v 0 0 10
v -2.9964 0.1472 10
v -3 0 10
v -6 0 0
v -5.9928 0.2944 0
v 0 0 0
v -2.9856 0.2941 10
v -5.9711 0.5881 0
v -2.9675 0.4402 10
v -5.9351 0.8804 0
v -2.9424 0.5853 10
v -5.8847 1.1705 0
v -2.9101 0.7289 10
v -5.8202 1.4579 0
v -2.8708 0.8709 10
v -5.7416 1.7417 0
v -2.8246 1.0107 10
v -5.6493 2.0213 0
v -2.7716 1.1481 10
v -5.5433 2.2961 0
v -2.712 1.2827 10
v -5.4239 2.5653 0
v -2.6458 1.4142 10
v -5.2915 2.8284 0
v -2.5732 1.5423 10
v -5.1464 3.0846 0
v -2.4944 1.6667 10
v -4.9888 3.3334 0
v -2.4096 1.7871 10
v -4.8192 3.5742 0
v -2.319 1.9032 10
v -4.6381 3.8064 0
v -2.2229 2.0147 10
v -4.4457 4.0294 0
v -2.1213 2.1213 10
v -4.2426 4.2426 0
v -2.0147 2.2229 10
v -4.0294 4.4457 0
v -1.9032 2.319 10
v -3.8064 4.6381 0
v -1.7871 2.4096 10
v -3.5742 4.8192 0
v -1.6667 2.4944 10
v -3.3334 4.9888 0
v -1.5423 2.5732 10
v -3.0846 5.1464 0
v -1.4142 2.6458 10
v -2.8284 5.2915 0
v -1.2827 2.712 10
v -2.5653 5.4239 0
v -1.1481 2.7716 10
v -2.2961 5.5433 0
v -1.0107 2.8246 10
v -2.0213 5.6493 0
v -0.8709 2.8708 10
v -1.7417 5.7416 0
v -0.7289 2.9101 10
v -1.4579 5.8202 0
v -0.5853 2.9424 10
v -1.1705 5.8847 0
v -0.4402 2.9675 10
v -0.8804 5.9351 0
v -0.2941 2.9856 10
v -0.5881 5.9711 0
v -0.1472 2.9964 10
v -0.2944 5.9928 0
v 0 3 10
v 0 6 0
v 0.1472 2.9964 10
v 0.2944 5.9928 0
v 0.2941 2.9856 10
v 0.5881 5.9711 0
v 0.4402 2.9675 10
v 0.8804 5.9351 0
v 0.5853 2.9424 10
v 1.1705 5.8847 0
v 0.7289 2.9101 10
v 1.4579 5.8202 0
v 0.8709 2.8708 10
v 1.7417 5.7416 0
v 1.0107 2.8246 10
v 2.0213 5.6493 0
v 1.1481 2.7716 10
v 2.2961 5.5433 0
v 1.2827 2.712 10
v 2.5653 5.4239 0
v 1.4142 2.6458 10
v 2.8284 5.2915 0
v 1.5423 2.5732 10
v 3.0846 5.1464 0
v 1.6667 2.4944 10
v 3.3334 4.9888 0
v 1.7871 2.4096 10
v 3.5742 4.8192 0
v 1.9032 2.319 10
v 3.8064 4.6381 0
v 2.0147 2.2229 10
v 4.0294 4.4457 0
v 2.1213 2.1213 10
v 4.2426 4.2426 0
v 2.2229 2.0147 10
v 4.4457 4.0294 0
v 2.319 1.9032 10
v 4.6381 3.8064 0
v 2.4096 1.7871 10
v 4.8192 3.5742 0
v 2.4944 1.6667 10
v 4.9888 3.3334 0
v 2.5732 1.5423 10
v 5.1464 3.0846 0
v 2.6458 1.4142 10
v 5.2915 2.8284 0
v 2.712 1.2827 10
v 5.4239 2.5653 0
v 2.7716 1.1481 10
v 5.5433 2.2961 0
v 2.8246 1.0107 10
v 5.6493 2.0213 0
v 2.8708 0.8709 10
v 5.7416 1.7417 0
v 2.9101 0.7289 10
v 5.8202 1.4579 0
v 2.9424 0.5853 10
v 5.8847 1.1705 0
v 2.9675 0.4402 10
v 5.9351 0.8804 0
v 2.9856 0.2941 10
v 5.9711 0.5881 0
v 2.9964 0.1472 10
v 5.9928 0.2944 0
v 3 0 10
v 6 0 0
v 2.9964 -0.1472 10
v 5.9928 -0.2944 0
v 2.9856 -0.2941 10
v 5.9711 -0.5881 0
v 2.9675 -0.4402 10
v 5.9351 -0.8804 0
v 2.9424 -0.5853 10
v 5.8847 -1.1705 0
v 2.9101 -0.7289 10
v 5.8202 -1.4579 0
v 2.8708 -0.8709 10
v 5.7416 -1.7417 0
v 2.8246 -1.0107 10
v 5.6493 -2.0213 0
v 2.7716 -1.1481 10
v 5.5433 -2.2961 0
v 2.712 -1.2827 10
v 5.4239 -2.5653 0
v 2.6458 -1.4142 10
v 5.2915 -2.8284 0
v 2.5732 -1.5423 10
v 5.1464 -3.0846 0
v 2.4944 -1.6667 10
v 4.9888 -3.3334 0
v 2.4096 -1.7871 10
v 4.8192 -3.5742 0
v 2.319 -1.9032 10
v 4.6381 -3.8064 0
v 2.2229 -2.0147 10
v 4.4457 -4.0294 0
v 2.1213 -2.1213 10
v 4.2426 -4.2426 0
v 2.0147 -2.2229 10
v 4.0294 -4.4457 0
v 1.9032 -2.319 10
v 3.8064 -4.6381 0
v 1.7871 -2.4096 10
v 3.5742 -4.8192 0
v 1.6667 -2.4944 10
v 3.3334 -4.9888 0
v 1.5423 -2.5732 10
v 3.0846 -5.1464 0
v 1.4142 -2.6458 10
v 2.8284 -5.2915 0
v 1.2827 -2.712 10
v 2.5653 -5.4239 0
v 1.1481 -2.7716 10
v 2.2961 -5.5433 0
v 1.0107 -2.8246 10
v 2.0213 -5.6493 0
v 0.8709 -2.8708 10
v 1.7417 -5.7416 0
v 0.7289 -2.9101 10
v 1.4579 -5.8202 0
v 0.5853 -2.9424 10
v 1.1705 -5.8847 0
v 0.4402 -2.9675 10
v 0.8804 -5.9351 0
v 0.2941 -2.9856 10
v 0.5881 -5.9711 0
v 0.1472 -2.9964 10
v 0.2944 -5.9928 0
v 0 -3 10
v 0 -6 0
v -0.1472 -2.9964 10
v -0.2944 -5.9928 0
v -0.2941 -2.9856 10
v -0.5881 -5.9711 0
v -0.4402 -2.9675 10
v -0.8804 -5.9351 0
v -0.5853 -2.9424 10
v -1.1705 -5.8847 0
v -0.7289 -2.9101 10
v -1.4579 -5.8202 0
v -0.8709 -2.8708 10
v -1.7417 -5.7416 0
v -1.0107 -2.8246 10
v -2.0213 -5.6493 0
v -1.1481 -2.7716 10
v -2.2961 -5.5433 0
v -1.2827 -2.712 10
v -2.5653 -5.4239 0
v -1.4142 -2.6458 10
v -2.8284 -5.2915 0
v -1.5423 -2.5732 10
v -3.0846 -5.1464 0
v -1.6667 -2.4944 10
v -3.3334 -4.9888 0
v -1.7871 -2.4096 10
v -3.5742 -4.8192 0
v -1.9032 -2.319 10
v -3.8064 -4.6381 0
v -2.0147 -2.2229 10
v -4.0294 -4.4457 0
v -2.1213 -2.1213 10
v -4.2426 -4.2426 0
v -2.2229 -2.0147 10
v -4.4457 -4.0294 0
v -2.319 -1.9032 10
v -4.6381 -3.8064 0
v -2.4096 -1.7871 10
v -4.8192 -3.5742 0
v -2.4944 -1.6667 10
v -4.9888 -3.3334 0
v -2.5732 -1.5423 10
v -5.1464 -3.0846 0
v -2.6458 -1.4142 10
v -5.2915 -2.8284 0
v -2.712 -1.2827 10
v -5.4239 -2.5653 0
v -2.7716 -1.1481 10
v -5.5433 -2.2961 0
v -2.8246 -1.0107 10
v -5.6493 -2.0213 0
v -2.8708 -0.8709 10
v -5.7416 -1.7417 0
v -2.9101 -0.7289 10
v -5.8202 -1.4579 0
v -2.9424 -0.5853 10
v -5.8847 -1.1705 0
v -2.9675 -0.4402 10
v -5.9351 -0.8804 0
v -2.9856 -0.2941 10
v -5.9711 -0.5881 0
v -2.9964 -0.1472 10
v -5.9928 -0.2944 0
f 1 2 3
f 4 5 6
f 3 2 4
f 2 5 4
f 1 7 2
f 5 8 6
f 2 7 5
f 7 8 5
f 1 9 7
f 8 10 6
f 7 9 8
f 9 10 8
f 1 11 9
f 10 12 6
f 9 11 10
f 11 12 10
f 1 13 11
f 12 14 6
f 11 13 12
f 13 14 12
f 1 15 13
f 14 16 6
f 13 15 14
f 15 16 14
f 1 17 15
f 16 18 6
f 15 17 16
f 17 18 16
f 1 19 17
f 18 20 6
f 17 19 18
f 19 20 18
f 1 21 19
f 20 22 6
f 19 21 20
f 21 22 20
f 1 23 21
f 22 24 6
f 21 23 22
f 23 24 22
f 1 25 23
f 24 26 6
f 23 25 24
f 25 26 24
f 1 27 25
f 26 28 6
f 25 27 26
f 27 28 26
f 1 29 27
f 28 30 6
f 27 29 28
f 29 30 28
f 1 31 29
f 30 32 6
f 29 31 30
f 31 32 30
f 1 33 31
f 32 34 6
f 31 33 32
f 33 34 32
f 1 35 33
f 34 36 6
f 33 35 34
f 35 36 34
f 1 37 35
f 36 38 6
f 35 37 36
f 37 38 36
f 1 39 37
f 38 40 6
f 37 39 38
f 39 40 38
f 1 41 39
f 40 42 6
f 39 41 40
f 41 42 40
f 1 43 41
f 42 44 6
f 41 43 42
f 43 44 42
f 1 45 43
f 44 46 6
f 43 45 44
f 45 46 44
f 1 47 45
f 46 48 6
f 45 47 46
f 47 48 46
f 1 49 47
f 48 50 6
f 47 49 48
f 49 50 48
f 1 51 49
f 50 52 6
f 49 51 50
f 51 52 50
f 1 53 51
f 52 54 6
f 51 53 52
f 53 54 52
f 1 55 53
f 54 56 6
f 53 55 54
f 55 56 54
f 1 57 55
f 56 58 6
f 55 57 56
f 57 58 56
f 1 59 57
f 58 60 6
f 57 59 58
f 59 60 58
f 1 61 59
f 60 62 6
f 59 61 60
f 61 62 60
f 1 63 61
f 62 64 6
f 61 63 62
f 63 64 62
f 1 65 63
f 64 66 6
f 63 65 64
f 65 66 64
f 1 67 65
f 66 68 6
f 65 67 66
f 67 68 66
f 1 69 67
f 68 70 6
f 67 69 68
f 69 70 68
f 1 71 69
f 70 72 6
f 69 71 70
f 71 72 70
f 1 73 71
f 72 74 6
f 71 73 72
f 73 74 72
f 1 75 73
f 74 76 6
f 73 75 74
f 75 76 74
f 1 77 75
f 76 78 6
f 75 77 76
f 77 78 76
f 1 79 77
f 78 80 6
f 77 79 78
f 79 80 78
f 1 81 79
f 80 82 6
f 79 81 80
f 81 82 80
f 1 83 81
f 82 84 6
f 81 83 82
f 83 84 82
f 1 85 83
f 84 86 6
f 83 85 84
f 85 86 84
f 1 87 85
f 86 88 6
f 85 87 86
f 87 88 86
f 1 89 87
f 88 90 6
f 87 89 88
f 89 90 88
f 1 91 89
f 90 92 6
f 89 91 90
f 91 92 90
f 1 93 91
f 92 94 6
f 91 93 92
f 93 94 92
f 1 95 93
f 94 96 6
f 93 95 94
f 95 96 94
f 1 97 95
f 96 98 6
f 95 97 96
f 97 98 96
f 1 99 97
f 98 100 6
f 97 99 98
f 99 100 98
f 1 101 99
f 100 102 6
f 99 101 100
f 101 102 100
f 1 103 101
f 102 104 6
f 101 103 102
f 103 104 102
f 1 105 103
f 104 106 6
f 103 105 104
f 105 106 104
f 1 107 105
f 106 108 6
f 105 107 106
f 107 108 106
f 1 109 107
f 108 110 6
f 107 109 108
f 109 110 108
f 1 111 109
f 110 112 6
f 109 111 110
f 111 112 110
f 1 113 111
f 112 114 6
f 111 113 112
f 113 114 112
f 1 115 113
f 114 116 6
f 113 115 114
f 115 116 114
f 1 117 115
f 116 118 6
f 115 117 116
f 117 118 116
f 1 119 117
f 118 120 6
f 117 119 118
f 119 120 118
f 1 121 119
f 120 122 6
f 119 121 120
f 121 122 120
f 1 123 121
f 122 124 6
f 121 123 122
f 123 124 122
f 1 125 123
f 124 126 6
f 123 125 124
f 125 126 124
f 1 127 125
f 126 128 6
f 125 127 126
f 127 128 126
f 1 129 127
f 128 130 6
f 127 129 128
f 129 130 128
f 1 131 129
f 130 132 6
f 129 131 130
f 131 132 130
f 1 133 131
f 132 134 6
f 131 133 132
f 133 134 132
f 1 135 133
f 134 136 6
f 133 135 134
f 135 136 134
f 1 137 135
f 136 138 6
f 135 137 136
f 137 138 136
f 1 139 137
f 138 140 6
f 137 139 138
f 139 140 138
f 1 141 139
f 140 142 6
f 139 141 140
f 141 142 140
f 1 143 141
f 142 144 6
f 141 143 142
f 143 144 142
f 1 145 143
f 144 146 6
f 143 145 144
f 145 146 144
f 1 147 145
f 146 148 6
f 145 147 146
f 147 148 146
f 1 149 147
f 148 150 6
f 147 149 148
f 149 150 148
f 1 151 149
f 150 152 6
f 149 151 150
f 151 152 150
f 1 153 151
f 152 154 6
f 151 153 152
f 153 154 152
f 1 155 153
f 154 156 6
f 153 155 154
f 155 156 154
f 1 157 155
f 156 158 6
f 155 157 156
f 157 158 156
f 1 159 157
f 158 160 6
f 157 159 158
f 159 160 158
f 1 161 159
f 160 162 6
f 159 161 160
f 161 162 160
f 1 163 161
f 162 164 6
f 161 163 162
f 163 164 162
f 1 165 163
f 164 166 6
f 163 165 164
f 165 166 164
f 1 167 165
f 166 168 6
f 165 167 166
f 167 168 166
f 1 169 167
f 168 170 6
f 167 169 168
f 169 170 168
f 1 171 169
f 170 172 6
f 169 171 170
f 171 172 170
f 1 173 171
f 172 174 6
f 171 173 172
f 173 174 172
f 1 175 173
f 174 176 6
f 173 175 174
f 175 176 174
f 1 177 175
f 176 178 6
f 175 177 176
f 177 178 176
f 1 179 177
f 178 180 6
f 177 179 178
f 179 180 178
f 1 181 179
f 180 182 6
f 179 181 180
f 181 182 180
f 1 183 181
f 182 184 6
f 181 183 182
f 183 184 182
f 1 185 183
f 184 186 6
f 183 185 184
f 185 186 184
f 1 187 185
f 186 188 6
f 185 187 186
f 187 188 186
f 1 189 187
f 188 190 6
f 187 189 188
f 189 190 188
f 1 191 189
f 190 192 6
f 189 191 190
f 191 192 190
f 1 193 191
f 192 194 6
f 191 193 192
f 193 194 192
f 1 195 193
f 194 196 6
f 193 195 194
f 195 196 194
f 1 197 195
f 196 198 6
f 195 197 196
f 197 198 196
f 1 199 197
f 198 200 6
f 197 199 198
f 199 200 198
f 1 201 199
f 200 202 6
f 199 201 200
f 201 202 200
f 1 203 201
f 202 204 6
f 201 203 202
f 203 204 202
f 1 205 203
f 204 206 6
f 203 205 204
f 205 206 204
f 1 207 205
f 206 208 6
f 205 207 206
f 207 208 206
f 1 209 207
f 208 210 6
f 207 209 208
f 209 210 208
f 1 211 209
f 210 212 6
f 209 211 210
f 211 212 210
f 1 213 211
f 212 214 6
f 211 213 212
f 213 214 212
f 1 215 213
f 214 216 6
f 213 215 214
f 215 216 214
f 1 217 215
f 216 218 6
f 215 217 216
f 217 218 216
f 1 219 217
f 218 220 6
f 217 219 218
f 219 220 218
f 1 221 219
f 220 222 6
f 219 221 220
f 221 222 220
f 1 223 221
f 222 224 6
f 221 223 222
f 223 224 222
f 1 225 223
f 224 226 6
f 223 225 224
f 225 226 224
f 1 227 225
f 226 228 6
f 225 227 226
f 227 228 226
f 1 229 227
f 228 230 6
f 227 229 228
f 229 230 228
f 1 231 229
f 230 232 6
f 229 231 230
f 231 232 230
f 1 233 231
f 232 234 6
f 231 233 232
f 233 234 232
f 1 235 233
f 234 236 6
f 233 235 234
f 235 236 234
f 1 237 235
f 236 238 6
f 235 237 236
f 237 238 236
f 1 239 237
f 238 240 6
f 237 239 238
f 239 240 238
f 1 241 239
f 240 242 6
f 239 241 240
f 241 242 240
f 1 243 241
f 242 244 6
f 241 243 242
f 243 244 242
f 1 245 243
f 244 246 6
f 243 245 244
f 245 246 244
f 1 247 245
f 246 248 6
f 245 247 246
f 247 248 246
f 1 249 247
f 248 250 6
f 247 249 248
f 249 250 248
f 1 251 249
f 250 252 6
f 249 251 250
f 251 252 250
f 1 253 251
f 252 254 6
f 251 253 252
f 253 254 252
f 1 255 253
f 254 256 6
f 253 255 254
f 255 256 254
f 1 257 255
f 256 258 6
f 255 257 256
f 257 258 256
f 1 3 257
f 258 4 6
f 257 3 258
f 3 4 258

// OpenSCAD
// Auto-generated from tests/data/feature_fixtures_manifest.json
// fixture: revolve_frustum_trapezoid
// fixture_type: revolve
// description: Trapezoidal frustum profile revolved around Z; Phase 2 cone primitive upgrade (r1=6, r2=3).
$fn = 96;

profile = [
    [0.000000, 0.000000],
    [6.000000, 0.000000],
    [3.000000, 10.000000],
    [0.000000, 10.000000]
];

rotate_extrude($fn=128) polygon(points=profile);
